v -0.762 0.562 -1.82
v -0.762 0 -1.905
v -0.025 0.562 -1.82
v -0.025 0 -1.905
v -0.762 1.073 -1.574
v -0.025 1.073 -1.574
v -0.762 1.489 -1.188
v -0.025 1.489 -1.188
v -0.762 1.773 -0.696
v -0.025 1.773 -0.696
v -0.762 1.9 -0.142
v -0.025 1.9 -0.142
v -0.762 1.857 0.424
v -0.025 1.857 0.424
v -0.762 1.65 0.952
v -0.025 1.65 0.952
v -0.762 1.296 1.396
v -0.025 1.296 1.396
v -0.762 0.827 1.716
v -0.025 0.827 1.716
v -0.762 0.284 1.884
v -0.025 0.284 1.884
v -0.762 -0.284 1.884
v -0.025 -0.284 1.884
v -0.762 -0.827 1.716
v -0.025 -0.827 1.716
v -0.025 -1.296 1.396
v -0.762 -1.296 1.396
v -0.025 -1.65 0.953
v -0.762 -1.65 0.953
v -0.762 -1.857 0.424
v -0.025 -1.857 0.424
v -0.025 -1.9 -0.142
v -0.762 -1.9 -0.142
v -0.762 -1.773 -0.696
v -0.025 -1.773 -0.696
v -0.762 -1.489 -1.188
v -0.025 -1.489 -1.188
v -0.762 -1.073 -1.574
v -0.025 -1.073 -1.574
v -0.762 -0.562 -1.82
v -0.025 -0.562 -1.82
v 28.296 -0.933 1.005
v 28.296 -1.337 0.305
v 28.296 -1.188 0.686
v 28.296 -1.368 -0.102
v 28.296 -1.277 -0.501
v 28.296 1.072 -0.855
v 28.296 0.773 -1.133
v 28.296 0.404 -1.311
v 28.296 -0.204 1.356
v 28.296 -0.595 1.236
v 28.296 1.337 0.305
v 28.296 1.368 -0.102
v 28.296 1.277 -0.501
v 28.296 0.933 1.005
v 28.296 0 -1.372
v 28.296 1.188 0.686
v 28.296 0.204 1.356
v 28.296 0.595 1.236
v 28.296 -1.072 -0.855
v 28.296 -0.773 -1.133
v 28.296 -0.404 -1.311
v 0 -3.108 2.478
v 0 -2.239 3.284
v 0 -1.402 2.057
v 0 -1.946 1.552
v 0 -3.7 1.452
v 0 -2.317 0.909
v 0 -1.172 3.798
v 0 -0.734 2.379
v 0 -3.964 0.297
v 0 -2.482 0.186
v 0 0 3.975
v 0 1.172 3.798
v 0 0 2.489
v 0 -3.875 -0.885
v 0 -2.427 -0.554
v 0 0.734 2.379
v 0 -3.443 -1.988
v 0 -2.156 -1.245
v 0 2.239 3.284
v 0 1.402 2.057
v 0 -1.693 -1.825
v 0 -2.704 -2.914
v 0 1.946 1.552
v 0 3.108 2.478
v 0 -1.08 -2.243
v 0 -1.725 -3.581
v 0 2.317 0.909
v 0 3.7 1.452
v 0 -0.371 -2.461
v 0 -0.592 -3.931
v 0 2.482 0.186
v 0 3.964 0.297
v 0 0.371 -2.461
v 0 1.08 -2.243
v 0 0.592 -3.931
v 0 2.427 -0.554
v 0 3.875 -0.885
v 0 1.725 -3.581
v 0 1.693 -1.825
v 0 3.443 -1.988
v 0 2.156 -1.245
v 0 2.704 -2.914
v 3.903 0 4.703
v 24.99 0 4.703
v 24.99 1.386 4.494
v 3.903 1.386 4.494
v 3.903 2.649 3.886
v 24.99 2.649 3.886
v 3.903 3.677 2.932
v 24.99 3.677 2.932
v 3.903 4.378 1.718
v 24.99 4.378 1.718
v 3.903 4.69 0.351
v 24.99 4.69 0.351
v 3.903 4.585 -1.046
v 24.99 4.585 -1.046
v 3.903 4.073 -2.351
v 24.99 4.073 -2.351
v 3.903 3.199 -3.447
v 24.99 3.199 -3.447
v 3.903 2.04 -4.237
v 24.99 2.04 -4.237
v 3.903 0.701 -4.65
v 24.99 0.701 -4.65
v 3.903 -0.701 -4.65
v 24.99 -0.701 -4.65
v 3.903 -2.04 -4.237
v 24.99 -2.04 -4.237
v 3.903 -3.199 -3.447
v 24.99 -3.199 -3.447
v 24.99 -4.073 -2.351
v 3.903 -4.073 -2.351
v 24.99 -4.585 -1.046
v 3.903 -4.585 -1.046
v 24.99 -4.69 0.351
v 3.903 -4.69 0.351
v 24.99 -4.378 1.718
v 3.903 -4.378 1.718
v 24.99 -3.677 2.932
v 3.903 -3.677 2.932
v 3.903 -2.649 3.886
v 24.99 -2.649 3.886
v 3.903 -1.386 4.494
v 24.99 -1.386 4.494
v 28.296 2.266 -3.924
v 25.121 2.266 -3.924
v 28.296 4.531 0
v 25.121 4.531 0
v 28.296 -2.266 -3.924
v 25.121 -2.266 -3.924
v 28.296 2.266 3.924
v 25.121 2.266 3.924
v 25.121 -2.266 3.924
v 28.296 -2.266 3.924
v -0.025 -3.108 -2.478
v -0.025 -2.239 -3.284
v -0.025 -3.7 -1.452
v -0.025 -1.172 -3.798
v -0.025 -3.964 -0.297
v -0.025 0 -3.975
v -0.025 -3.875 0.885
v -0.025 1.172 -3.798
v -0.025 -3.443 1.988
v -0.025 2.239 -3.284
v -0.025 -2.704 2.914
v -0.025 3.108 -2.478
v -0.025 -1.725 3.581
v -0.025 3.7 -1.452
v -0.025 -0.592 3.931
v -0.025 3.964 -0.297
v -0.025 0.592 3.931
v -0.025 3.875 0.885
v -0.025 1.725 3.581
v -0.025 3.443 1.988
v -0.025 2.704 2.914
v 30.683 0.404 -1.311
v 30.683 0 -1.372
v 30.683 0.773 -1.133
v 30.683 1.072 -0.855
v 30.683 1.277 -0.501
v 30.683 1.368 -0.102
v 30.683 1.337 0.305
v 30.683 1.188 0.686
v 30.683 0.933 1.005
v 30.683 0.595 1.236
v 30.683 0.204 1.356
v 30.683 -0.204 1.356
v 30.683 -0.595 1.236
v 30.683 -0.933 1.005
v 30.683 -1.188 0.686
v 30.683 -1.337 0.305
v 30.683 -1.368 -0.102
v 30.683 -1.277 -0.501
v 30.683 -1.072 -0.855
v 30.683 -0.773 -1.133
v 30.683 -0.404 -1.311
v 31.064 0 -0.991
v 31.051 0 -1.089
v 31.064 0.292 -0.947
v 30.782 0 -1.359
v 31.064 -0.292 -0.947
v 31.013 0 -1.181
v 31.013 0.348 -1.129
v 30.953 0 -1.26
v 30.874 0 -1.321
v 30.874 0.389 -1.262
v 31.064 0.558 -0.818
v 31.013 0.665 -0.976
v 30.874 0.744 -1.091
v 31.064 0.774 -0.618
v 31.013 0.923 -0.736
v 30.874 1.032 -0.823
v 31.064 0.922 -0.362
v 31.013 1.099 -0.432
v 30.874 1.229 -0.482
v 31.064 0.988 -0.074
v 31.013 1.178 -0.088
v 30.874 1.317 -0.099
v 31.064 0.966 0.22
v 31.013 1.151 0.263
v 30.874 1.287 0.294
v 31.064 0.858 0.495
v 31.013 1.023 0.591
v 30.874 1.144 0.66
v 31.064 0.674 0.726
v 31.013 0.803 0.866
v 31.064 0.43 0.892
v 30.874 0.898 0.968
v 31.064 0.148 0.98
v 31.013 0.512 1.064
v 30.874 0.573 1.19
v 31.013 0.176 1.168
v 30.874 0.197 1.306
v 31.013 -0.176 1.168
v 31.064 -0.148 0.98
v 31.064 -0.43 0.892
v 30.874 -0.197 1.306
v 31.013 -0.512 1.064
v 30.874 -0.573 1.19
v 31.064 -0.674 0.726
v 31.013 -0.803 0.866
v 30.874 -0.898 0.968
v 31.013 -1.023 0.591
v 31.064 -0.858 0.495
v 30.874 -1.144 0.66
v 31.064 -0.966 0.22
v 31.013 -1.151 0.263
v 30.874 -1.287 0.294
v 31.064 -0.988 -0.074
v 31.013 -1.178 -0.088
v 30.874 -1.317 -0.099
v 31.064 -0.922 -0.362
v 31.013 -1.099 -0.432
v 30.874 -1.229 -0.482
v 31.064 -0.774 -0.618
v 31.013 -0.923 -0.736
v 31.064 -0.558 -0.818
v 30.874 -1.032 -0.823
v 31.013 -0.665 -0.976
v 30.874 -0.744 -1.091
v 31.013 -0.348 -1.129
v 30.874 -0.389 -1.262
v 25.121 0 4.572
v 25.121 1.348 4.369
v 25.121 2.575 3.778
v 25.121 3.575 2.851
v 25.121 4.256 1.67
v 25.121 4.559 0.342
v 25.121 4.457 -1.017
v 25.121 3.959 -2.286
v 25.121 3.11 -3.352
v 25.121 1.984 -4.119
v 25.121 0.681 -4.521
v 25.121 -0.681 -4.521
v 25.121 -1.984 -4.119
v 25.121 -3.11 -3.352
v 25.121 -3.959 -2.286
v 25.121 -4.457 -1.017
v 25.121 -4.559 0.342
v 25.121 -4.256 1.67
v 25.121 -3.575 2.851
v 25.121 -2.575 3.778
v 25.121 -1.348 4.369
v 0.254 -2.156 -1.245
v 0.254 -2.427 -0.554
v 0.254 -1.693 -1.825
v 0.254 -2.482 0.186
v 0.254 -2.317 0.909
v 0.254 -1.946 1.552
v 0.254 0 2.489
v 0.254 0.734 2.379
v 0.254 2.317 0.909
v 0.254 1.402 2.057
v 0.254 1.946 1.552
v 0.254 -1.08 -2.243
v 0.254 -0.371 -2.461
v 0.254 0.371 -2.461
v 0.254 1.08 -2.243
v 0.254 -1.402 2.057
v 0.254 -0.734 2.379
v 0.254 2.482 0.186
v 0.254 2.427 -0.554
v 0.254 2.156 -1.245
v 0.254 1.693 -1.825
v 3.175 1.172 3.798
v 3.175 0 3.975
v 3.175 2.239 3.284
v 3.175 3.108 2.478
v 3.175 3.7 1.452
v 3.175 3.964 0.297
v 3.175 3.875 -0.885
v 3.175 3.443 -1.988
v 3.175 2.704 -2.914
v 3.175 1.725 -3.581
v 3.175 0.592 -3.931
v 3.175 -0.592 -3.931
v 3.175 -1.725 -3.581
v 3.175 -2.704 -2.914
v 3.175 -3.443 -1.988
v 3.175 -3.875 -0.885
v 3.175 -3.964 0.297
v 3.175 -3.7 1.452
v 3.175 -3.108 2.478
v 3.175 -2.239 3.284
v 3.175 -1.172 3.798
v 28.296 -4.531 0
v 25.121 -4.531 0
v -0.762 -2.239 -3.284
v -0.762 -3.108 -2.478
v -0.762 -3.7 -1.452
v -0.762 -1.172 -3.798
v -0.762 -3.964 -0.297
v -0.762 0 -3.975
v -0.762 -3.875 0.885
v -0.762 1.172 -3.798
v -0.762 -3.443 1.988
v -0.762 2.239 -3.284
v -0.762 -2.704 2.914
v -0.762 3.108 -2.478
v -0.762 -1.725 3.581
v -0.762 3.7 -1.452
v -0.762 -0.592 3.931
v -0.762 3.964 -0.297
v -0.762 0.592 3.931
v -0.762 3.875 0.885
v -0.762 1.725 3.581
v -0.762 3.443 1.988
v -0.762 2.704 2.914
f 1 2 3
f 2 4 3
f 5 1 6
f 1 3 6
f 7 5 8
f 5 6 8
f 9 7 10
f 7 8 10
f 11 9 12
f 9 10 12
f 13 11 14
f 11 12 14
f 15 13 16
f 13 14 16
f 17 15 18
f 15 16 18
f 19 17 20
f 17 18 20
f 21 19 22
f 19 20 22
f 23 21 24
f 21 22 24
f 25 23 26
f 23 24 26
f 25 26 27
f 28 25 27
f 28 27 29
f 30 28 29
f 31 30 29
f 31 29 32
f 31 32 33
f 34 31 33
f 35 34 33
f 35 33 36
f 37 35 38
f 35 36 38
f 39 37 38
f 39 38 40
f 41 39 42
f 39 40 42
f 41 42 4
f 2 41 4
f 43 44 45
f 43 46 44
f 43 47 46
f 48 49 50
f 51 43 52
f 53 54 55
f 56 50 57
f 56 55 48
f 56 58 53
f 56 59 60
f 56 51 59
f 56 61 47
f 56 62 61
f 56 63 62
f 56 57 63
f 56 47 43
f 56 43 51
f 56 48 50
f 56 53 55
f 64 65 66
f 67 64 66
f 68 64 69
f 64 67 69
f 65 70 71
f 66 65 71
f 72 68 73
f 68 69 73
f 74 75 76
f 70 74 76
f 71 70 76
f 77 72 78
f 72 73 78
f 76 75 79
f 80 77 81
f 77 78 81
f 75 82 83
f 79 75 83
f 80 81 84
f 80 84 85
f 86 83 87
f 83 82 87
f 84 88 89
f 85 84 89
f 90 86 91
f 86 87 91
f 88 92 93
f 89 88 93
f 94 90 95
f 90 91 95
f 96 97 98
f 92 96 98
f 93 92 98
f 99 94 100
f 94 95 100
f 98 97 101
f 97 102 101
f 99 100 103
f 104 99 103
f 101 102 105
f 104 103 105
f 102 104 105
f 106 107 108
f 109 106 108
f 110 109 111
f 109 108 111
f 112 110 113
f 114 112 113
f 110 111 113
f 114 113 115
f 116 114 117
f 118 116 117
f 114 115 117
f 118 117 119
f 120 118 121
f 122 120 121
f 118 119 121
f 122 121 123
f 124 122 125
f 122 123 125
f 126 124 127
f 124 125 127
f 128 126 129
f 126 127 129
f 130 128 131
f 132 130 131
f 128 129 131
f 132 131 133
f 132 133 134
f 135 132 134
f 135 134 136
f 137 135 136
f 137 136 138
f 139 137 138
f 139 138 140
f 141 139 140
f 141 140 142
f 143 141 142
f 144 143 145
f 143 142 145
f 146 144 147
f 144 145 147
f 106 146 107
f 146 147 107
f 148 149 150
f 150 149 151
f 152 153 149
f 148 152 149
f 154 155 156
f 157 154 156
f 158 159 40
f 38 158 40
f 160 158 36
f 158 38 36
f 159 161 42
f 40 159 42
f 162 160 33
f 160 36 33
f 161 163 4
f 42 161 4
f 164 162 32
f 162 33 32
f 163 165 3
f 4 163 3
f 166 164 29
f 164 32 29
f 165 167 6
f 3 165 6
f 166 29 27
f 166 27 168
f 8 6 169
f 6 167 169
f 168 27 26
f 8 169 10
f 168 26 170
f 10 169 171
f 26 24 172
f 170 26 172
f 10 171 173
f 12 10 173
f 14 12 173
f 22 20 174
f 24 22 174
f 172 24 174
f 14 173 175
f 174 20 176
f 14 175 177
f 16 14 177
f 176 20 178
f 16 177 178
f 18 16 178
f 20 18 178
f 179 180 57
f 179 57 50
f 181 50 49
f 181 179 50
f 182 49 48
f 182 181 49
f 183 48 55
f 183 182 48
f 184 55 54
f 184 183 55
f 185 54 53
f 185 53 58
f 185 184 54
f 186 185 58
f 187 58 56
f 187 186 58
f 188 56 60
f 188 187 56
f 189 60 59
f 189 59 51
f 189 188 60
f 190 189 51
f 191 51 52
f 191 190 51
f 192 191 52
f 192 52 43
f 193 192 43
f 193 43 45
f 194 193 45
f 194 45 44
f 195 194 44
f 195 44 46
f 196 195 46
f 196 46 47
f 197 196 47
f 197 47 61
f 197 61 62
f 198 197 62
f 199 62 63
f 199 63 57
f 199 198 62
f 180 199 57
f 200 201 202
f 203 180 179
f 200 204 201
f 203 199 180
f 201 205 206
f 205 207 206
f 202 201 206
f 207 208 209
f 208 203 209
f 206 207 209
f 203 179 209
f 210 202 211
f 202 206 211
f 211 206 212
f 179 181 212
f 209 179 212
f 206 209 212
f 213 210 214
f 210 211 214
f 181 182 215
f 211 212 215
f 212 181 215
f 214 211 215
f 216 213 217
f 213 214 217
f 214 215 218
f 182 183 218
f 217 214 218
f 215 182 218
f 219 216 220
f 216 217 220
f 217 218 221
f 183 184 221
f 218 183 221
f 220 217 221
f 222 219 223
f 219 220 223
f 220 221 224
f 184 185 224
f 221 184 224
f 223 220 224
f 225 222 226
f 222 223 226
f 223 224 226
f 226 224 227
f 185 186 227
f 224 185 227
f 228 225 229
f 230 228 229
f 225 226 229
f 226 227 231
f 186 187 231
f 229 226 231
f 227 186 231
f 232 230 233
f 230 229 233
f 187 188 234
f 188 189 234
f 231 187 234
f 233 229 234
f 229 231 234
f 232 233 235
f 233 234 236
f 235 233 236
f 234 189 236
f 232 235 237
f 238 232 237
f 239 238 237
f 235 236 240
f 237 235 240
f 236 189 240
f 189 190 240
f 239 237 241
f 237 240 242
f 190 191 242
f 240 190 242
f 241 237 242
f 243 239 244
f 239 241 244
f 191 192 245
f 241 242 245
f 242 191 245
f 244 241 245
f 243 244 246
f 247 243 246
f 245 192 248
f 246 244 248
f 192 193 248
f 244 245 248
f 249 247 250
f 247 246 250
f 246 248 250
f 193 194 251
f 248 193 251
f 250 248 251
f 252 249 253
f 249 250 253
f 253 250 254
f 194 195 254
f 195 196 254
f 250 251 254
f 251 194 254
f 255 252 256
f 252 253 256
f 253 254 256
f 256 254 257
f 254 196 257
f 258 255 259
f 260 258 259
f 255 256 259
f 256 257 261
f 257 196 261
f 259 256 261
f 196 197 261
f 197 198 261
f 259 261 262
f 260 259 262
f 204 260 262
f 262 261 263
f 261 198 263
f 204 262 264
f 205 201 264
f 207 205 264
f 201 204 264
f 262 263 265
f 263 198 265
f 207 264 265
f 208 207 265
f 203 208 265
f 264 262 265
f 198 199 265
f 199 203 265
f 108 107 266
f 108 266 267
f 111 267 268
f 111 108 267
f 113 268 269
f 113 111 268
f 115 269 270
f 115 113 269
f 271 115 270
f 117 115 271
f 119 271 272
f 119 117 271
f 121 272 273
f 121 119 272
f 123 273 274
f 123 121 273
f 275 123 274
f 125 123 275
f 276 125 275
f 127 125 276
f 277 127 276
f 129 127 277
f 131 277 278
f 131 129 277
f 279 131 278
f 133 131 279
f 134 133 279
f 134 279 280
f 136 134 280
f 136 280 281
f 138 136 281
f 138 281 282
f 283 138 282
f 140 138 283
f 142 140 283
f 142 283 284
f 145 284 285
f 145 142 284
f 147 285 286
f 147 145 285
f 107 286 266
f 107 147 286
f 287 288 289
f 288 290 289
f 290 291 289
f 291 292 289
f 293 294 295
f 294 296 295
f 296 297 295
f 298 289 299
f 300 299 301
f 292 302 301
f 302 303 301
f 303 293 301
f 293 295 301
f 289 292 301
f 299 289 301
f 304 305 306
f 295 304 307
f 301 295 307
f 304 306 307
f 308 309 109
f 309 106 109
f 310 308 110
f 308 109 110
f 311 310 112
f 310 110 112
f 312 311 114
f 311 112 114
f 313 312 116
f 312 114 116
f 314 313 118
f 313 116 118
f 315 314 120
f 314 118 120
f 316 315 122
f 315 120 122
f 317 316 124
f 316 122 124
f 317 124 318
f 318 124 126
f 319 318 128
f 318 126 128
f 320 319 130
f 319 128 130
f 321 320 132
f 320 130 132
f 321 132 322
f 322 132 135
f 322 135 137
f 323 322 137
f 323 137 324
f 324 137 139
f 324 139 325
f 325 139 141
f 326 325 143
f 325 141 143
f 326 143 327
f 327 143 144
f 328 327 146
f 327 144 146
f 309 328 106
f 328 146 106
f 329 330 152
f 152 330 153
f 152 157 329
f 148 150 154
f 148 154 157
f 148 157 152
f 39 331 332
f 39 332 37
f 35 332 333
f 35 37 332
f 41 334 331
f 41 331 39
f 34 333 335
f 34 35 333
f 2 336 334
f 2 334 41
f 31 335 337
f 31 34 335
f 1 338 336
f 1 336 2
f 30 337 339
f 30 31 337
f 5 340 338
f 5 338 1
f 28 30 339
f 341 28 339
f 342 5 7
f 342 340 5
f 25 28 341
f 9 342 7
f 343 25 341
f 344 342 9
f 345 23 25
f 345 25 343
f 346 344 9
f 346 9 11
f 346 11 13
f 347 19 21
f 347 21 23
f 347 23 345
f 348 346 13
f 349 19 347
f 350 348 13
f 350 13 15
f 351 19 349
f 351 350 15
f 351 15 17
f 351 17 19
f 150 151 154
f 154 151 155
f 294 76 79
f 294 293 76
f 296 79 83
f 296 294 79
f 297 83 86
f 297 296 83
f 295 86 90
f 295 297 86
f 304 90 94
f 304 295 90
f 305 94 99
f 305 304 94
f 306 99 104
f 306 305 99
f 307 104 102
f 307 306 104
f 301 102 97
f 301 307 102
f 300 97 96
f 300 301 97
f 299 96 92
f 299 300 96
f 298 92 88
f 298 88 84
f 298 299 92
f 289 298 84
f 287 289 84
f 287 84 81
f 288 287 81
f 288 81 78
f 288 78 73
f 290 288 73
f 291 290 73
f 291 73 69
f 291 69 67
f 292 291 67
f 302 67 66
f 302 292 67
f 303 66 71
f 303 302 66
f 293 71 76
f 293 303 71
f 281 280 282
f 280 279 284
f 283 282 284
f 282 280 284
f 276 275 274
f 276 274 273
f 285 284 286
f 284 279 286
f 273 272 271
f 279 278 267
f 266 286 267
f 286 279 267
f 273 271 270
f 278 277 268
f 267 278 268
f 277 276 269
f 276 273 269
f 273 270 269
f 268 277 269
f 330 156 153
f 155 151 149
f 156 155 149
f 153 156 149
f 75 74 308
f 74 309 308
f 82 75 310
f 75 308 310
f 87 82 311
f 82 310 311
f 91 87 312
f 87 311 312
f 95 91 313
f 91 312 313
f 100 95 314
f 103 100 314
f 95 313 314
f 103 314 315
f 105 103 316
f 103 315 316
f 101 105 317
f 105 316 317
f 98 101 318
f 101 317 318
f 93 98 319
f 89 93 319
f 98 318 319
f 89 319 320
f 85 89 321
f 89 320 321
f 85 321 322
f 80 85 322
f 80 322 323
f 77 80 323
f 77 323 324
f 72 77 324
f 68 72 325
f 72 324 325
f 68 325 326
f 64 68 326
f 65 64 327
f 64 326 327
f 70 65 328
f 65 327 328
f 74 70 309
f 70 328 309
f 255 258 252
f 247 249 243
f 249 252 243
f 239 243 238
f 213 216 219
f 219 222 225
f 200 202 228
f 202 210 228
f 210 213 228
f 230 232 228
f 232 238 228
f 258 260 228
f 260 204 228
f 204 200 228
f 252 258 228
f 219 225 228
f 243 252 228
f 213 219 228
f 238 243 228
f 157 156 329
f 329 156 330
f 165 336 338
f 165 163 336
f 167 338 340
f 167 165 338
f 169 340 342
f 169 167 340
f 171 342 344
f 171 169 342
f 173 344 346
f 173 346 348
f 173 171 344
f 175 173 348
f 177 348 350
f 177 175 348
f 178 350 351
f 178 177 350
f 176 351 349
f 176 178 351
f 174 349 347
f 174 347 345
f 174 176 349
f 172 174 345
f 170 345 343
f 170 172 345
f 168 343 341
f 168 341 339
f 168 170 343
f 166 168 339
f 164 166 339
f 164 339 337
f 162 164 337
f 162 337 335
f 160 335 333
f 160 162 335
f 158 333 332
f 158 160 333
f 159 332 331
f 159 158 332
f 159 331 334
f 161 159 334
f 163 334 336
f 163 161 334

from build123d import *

# Parameters (mm, degrees)
SKETCH11_W     = 0.7366
SKETCH11_H     = 2.0701
EXTRUDE3_DEPTH = 3.175
SKETCH14_W     = 2.7686
SKETCH14_H     = 1.3716
SKETCH15_W     = 2.4892
SKETCH15_H     = 0.254
CHAMFER3_SIZE  = 0.13081
FILLET3_R      = 0.381


with BuildPart() as part:
    # Sketch11 → Revolve5 (revolve)
    with BuildSketch(Plane.XY, mode=Mode.PRIVATE) as revolve5_sk:
        with Locations((-0.3937, 2.94005)):
            Rectangle(SKETCH11_W, SKETCH11_H)
    revolve(revolve5_sk.sketch.rotate(Axis((-0.762, 0, 0), (1, 0, 0)), 270), axis=Axis((-0.762, 0, 0), (1, 0, 0)))  # turned: the seam where the file's is


with BuildPart() as body_2:
    # Sketch12 → Revolve6 (revolve)
    with BuildSketch(Plane(origin=(0, 0, 0), x_dir=(-1, 0, 0), z_dir=(0, 0, -1)), mode=Mode.PRIVATE) as revolve6_sk:
        Polygon((-25.1206, 4.70281), (-25.1206, 0), (0, 0), (0, 3.9751), (-3.175, 3.9751), (-3.90271, 4.70281), align=None)
    revolve(revolve6_sk.sketch.rotate(Axis((30.602542541, 0, 0), (-1, 0, 0)), 270), axis=Axis((30.602542541, 0, 0), (-1, 0, 0)))  # turned: the seam where the file's is

    # Sketch15 → Hole3 (revolve, cut)
    with BuildSketch(Plane.ZX):
        with Locations((1.2446, 0.127)):
            Rectangle(SKETCH15_W, SKETCH15_H)
    revolve(axis=Axis((110, 0, 0), (-1, 0, 0)), mode=Mode.SUBTRACT)

    # Chamfer3
    chamfer3_edges = [body_2.edges().sort_by_distance(p)[0] for p in [
        (25.1206, 0, -4.70281),
    ]]
    chamfer(chamfer3_edges, length=CHAMFER3_SIZE)


with BuildPart() as body_3:
    # Sketch13 → Extrude3 (new body)
    with BuildSketch(Plane(origin=(25.1206, 0, 0), x_dir=(0, 0, -1), z_dir=(1, 0, 0))):
        Polygon((3.9243, 2.265695661), (0, 4.531391323), (-3.9243, 2.265695661), (-3.9243, -2.265695661), (0, -4.531391323), (3.9243, -2.265695661), align=None)
    extrude(amount=EXTRUDE3_DEPTH)


with BuildPart() as body_4:
    # Sketch14 → Revolve7 (revolve)
    with BuildSketch(Plane.XY, mode=Mode.PRIVATE) as revolve7_sk:
        with Locations((29.6799, 0.6858)):
            Rectangle(SKETCH14_W, SKETCH14_H)
    revolve(revolve7_sk.sketch.rotate(Axis((28.2956, 0, 0), (1, 0, 0)), 270), axis=Axis((28.2956, 0, 0), (1, 0, 0)))  # turned: the seam where the file's is

    # Fillet3
    fillet3_edges = [body_4.edges().sort_by_distance(p)[0] for p in [
        (31.0642, 0, 1.3716),
    ]]
    fillet(fillet3_edges, radius=FILLET3_R)


solid = Compound([part.part, body_2.part, body_3.part, body_4.part])
